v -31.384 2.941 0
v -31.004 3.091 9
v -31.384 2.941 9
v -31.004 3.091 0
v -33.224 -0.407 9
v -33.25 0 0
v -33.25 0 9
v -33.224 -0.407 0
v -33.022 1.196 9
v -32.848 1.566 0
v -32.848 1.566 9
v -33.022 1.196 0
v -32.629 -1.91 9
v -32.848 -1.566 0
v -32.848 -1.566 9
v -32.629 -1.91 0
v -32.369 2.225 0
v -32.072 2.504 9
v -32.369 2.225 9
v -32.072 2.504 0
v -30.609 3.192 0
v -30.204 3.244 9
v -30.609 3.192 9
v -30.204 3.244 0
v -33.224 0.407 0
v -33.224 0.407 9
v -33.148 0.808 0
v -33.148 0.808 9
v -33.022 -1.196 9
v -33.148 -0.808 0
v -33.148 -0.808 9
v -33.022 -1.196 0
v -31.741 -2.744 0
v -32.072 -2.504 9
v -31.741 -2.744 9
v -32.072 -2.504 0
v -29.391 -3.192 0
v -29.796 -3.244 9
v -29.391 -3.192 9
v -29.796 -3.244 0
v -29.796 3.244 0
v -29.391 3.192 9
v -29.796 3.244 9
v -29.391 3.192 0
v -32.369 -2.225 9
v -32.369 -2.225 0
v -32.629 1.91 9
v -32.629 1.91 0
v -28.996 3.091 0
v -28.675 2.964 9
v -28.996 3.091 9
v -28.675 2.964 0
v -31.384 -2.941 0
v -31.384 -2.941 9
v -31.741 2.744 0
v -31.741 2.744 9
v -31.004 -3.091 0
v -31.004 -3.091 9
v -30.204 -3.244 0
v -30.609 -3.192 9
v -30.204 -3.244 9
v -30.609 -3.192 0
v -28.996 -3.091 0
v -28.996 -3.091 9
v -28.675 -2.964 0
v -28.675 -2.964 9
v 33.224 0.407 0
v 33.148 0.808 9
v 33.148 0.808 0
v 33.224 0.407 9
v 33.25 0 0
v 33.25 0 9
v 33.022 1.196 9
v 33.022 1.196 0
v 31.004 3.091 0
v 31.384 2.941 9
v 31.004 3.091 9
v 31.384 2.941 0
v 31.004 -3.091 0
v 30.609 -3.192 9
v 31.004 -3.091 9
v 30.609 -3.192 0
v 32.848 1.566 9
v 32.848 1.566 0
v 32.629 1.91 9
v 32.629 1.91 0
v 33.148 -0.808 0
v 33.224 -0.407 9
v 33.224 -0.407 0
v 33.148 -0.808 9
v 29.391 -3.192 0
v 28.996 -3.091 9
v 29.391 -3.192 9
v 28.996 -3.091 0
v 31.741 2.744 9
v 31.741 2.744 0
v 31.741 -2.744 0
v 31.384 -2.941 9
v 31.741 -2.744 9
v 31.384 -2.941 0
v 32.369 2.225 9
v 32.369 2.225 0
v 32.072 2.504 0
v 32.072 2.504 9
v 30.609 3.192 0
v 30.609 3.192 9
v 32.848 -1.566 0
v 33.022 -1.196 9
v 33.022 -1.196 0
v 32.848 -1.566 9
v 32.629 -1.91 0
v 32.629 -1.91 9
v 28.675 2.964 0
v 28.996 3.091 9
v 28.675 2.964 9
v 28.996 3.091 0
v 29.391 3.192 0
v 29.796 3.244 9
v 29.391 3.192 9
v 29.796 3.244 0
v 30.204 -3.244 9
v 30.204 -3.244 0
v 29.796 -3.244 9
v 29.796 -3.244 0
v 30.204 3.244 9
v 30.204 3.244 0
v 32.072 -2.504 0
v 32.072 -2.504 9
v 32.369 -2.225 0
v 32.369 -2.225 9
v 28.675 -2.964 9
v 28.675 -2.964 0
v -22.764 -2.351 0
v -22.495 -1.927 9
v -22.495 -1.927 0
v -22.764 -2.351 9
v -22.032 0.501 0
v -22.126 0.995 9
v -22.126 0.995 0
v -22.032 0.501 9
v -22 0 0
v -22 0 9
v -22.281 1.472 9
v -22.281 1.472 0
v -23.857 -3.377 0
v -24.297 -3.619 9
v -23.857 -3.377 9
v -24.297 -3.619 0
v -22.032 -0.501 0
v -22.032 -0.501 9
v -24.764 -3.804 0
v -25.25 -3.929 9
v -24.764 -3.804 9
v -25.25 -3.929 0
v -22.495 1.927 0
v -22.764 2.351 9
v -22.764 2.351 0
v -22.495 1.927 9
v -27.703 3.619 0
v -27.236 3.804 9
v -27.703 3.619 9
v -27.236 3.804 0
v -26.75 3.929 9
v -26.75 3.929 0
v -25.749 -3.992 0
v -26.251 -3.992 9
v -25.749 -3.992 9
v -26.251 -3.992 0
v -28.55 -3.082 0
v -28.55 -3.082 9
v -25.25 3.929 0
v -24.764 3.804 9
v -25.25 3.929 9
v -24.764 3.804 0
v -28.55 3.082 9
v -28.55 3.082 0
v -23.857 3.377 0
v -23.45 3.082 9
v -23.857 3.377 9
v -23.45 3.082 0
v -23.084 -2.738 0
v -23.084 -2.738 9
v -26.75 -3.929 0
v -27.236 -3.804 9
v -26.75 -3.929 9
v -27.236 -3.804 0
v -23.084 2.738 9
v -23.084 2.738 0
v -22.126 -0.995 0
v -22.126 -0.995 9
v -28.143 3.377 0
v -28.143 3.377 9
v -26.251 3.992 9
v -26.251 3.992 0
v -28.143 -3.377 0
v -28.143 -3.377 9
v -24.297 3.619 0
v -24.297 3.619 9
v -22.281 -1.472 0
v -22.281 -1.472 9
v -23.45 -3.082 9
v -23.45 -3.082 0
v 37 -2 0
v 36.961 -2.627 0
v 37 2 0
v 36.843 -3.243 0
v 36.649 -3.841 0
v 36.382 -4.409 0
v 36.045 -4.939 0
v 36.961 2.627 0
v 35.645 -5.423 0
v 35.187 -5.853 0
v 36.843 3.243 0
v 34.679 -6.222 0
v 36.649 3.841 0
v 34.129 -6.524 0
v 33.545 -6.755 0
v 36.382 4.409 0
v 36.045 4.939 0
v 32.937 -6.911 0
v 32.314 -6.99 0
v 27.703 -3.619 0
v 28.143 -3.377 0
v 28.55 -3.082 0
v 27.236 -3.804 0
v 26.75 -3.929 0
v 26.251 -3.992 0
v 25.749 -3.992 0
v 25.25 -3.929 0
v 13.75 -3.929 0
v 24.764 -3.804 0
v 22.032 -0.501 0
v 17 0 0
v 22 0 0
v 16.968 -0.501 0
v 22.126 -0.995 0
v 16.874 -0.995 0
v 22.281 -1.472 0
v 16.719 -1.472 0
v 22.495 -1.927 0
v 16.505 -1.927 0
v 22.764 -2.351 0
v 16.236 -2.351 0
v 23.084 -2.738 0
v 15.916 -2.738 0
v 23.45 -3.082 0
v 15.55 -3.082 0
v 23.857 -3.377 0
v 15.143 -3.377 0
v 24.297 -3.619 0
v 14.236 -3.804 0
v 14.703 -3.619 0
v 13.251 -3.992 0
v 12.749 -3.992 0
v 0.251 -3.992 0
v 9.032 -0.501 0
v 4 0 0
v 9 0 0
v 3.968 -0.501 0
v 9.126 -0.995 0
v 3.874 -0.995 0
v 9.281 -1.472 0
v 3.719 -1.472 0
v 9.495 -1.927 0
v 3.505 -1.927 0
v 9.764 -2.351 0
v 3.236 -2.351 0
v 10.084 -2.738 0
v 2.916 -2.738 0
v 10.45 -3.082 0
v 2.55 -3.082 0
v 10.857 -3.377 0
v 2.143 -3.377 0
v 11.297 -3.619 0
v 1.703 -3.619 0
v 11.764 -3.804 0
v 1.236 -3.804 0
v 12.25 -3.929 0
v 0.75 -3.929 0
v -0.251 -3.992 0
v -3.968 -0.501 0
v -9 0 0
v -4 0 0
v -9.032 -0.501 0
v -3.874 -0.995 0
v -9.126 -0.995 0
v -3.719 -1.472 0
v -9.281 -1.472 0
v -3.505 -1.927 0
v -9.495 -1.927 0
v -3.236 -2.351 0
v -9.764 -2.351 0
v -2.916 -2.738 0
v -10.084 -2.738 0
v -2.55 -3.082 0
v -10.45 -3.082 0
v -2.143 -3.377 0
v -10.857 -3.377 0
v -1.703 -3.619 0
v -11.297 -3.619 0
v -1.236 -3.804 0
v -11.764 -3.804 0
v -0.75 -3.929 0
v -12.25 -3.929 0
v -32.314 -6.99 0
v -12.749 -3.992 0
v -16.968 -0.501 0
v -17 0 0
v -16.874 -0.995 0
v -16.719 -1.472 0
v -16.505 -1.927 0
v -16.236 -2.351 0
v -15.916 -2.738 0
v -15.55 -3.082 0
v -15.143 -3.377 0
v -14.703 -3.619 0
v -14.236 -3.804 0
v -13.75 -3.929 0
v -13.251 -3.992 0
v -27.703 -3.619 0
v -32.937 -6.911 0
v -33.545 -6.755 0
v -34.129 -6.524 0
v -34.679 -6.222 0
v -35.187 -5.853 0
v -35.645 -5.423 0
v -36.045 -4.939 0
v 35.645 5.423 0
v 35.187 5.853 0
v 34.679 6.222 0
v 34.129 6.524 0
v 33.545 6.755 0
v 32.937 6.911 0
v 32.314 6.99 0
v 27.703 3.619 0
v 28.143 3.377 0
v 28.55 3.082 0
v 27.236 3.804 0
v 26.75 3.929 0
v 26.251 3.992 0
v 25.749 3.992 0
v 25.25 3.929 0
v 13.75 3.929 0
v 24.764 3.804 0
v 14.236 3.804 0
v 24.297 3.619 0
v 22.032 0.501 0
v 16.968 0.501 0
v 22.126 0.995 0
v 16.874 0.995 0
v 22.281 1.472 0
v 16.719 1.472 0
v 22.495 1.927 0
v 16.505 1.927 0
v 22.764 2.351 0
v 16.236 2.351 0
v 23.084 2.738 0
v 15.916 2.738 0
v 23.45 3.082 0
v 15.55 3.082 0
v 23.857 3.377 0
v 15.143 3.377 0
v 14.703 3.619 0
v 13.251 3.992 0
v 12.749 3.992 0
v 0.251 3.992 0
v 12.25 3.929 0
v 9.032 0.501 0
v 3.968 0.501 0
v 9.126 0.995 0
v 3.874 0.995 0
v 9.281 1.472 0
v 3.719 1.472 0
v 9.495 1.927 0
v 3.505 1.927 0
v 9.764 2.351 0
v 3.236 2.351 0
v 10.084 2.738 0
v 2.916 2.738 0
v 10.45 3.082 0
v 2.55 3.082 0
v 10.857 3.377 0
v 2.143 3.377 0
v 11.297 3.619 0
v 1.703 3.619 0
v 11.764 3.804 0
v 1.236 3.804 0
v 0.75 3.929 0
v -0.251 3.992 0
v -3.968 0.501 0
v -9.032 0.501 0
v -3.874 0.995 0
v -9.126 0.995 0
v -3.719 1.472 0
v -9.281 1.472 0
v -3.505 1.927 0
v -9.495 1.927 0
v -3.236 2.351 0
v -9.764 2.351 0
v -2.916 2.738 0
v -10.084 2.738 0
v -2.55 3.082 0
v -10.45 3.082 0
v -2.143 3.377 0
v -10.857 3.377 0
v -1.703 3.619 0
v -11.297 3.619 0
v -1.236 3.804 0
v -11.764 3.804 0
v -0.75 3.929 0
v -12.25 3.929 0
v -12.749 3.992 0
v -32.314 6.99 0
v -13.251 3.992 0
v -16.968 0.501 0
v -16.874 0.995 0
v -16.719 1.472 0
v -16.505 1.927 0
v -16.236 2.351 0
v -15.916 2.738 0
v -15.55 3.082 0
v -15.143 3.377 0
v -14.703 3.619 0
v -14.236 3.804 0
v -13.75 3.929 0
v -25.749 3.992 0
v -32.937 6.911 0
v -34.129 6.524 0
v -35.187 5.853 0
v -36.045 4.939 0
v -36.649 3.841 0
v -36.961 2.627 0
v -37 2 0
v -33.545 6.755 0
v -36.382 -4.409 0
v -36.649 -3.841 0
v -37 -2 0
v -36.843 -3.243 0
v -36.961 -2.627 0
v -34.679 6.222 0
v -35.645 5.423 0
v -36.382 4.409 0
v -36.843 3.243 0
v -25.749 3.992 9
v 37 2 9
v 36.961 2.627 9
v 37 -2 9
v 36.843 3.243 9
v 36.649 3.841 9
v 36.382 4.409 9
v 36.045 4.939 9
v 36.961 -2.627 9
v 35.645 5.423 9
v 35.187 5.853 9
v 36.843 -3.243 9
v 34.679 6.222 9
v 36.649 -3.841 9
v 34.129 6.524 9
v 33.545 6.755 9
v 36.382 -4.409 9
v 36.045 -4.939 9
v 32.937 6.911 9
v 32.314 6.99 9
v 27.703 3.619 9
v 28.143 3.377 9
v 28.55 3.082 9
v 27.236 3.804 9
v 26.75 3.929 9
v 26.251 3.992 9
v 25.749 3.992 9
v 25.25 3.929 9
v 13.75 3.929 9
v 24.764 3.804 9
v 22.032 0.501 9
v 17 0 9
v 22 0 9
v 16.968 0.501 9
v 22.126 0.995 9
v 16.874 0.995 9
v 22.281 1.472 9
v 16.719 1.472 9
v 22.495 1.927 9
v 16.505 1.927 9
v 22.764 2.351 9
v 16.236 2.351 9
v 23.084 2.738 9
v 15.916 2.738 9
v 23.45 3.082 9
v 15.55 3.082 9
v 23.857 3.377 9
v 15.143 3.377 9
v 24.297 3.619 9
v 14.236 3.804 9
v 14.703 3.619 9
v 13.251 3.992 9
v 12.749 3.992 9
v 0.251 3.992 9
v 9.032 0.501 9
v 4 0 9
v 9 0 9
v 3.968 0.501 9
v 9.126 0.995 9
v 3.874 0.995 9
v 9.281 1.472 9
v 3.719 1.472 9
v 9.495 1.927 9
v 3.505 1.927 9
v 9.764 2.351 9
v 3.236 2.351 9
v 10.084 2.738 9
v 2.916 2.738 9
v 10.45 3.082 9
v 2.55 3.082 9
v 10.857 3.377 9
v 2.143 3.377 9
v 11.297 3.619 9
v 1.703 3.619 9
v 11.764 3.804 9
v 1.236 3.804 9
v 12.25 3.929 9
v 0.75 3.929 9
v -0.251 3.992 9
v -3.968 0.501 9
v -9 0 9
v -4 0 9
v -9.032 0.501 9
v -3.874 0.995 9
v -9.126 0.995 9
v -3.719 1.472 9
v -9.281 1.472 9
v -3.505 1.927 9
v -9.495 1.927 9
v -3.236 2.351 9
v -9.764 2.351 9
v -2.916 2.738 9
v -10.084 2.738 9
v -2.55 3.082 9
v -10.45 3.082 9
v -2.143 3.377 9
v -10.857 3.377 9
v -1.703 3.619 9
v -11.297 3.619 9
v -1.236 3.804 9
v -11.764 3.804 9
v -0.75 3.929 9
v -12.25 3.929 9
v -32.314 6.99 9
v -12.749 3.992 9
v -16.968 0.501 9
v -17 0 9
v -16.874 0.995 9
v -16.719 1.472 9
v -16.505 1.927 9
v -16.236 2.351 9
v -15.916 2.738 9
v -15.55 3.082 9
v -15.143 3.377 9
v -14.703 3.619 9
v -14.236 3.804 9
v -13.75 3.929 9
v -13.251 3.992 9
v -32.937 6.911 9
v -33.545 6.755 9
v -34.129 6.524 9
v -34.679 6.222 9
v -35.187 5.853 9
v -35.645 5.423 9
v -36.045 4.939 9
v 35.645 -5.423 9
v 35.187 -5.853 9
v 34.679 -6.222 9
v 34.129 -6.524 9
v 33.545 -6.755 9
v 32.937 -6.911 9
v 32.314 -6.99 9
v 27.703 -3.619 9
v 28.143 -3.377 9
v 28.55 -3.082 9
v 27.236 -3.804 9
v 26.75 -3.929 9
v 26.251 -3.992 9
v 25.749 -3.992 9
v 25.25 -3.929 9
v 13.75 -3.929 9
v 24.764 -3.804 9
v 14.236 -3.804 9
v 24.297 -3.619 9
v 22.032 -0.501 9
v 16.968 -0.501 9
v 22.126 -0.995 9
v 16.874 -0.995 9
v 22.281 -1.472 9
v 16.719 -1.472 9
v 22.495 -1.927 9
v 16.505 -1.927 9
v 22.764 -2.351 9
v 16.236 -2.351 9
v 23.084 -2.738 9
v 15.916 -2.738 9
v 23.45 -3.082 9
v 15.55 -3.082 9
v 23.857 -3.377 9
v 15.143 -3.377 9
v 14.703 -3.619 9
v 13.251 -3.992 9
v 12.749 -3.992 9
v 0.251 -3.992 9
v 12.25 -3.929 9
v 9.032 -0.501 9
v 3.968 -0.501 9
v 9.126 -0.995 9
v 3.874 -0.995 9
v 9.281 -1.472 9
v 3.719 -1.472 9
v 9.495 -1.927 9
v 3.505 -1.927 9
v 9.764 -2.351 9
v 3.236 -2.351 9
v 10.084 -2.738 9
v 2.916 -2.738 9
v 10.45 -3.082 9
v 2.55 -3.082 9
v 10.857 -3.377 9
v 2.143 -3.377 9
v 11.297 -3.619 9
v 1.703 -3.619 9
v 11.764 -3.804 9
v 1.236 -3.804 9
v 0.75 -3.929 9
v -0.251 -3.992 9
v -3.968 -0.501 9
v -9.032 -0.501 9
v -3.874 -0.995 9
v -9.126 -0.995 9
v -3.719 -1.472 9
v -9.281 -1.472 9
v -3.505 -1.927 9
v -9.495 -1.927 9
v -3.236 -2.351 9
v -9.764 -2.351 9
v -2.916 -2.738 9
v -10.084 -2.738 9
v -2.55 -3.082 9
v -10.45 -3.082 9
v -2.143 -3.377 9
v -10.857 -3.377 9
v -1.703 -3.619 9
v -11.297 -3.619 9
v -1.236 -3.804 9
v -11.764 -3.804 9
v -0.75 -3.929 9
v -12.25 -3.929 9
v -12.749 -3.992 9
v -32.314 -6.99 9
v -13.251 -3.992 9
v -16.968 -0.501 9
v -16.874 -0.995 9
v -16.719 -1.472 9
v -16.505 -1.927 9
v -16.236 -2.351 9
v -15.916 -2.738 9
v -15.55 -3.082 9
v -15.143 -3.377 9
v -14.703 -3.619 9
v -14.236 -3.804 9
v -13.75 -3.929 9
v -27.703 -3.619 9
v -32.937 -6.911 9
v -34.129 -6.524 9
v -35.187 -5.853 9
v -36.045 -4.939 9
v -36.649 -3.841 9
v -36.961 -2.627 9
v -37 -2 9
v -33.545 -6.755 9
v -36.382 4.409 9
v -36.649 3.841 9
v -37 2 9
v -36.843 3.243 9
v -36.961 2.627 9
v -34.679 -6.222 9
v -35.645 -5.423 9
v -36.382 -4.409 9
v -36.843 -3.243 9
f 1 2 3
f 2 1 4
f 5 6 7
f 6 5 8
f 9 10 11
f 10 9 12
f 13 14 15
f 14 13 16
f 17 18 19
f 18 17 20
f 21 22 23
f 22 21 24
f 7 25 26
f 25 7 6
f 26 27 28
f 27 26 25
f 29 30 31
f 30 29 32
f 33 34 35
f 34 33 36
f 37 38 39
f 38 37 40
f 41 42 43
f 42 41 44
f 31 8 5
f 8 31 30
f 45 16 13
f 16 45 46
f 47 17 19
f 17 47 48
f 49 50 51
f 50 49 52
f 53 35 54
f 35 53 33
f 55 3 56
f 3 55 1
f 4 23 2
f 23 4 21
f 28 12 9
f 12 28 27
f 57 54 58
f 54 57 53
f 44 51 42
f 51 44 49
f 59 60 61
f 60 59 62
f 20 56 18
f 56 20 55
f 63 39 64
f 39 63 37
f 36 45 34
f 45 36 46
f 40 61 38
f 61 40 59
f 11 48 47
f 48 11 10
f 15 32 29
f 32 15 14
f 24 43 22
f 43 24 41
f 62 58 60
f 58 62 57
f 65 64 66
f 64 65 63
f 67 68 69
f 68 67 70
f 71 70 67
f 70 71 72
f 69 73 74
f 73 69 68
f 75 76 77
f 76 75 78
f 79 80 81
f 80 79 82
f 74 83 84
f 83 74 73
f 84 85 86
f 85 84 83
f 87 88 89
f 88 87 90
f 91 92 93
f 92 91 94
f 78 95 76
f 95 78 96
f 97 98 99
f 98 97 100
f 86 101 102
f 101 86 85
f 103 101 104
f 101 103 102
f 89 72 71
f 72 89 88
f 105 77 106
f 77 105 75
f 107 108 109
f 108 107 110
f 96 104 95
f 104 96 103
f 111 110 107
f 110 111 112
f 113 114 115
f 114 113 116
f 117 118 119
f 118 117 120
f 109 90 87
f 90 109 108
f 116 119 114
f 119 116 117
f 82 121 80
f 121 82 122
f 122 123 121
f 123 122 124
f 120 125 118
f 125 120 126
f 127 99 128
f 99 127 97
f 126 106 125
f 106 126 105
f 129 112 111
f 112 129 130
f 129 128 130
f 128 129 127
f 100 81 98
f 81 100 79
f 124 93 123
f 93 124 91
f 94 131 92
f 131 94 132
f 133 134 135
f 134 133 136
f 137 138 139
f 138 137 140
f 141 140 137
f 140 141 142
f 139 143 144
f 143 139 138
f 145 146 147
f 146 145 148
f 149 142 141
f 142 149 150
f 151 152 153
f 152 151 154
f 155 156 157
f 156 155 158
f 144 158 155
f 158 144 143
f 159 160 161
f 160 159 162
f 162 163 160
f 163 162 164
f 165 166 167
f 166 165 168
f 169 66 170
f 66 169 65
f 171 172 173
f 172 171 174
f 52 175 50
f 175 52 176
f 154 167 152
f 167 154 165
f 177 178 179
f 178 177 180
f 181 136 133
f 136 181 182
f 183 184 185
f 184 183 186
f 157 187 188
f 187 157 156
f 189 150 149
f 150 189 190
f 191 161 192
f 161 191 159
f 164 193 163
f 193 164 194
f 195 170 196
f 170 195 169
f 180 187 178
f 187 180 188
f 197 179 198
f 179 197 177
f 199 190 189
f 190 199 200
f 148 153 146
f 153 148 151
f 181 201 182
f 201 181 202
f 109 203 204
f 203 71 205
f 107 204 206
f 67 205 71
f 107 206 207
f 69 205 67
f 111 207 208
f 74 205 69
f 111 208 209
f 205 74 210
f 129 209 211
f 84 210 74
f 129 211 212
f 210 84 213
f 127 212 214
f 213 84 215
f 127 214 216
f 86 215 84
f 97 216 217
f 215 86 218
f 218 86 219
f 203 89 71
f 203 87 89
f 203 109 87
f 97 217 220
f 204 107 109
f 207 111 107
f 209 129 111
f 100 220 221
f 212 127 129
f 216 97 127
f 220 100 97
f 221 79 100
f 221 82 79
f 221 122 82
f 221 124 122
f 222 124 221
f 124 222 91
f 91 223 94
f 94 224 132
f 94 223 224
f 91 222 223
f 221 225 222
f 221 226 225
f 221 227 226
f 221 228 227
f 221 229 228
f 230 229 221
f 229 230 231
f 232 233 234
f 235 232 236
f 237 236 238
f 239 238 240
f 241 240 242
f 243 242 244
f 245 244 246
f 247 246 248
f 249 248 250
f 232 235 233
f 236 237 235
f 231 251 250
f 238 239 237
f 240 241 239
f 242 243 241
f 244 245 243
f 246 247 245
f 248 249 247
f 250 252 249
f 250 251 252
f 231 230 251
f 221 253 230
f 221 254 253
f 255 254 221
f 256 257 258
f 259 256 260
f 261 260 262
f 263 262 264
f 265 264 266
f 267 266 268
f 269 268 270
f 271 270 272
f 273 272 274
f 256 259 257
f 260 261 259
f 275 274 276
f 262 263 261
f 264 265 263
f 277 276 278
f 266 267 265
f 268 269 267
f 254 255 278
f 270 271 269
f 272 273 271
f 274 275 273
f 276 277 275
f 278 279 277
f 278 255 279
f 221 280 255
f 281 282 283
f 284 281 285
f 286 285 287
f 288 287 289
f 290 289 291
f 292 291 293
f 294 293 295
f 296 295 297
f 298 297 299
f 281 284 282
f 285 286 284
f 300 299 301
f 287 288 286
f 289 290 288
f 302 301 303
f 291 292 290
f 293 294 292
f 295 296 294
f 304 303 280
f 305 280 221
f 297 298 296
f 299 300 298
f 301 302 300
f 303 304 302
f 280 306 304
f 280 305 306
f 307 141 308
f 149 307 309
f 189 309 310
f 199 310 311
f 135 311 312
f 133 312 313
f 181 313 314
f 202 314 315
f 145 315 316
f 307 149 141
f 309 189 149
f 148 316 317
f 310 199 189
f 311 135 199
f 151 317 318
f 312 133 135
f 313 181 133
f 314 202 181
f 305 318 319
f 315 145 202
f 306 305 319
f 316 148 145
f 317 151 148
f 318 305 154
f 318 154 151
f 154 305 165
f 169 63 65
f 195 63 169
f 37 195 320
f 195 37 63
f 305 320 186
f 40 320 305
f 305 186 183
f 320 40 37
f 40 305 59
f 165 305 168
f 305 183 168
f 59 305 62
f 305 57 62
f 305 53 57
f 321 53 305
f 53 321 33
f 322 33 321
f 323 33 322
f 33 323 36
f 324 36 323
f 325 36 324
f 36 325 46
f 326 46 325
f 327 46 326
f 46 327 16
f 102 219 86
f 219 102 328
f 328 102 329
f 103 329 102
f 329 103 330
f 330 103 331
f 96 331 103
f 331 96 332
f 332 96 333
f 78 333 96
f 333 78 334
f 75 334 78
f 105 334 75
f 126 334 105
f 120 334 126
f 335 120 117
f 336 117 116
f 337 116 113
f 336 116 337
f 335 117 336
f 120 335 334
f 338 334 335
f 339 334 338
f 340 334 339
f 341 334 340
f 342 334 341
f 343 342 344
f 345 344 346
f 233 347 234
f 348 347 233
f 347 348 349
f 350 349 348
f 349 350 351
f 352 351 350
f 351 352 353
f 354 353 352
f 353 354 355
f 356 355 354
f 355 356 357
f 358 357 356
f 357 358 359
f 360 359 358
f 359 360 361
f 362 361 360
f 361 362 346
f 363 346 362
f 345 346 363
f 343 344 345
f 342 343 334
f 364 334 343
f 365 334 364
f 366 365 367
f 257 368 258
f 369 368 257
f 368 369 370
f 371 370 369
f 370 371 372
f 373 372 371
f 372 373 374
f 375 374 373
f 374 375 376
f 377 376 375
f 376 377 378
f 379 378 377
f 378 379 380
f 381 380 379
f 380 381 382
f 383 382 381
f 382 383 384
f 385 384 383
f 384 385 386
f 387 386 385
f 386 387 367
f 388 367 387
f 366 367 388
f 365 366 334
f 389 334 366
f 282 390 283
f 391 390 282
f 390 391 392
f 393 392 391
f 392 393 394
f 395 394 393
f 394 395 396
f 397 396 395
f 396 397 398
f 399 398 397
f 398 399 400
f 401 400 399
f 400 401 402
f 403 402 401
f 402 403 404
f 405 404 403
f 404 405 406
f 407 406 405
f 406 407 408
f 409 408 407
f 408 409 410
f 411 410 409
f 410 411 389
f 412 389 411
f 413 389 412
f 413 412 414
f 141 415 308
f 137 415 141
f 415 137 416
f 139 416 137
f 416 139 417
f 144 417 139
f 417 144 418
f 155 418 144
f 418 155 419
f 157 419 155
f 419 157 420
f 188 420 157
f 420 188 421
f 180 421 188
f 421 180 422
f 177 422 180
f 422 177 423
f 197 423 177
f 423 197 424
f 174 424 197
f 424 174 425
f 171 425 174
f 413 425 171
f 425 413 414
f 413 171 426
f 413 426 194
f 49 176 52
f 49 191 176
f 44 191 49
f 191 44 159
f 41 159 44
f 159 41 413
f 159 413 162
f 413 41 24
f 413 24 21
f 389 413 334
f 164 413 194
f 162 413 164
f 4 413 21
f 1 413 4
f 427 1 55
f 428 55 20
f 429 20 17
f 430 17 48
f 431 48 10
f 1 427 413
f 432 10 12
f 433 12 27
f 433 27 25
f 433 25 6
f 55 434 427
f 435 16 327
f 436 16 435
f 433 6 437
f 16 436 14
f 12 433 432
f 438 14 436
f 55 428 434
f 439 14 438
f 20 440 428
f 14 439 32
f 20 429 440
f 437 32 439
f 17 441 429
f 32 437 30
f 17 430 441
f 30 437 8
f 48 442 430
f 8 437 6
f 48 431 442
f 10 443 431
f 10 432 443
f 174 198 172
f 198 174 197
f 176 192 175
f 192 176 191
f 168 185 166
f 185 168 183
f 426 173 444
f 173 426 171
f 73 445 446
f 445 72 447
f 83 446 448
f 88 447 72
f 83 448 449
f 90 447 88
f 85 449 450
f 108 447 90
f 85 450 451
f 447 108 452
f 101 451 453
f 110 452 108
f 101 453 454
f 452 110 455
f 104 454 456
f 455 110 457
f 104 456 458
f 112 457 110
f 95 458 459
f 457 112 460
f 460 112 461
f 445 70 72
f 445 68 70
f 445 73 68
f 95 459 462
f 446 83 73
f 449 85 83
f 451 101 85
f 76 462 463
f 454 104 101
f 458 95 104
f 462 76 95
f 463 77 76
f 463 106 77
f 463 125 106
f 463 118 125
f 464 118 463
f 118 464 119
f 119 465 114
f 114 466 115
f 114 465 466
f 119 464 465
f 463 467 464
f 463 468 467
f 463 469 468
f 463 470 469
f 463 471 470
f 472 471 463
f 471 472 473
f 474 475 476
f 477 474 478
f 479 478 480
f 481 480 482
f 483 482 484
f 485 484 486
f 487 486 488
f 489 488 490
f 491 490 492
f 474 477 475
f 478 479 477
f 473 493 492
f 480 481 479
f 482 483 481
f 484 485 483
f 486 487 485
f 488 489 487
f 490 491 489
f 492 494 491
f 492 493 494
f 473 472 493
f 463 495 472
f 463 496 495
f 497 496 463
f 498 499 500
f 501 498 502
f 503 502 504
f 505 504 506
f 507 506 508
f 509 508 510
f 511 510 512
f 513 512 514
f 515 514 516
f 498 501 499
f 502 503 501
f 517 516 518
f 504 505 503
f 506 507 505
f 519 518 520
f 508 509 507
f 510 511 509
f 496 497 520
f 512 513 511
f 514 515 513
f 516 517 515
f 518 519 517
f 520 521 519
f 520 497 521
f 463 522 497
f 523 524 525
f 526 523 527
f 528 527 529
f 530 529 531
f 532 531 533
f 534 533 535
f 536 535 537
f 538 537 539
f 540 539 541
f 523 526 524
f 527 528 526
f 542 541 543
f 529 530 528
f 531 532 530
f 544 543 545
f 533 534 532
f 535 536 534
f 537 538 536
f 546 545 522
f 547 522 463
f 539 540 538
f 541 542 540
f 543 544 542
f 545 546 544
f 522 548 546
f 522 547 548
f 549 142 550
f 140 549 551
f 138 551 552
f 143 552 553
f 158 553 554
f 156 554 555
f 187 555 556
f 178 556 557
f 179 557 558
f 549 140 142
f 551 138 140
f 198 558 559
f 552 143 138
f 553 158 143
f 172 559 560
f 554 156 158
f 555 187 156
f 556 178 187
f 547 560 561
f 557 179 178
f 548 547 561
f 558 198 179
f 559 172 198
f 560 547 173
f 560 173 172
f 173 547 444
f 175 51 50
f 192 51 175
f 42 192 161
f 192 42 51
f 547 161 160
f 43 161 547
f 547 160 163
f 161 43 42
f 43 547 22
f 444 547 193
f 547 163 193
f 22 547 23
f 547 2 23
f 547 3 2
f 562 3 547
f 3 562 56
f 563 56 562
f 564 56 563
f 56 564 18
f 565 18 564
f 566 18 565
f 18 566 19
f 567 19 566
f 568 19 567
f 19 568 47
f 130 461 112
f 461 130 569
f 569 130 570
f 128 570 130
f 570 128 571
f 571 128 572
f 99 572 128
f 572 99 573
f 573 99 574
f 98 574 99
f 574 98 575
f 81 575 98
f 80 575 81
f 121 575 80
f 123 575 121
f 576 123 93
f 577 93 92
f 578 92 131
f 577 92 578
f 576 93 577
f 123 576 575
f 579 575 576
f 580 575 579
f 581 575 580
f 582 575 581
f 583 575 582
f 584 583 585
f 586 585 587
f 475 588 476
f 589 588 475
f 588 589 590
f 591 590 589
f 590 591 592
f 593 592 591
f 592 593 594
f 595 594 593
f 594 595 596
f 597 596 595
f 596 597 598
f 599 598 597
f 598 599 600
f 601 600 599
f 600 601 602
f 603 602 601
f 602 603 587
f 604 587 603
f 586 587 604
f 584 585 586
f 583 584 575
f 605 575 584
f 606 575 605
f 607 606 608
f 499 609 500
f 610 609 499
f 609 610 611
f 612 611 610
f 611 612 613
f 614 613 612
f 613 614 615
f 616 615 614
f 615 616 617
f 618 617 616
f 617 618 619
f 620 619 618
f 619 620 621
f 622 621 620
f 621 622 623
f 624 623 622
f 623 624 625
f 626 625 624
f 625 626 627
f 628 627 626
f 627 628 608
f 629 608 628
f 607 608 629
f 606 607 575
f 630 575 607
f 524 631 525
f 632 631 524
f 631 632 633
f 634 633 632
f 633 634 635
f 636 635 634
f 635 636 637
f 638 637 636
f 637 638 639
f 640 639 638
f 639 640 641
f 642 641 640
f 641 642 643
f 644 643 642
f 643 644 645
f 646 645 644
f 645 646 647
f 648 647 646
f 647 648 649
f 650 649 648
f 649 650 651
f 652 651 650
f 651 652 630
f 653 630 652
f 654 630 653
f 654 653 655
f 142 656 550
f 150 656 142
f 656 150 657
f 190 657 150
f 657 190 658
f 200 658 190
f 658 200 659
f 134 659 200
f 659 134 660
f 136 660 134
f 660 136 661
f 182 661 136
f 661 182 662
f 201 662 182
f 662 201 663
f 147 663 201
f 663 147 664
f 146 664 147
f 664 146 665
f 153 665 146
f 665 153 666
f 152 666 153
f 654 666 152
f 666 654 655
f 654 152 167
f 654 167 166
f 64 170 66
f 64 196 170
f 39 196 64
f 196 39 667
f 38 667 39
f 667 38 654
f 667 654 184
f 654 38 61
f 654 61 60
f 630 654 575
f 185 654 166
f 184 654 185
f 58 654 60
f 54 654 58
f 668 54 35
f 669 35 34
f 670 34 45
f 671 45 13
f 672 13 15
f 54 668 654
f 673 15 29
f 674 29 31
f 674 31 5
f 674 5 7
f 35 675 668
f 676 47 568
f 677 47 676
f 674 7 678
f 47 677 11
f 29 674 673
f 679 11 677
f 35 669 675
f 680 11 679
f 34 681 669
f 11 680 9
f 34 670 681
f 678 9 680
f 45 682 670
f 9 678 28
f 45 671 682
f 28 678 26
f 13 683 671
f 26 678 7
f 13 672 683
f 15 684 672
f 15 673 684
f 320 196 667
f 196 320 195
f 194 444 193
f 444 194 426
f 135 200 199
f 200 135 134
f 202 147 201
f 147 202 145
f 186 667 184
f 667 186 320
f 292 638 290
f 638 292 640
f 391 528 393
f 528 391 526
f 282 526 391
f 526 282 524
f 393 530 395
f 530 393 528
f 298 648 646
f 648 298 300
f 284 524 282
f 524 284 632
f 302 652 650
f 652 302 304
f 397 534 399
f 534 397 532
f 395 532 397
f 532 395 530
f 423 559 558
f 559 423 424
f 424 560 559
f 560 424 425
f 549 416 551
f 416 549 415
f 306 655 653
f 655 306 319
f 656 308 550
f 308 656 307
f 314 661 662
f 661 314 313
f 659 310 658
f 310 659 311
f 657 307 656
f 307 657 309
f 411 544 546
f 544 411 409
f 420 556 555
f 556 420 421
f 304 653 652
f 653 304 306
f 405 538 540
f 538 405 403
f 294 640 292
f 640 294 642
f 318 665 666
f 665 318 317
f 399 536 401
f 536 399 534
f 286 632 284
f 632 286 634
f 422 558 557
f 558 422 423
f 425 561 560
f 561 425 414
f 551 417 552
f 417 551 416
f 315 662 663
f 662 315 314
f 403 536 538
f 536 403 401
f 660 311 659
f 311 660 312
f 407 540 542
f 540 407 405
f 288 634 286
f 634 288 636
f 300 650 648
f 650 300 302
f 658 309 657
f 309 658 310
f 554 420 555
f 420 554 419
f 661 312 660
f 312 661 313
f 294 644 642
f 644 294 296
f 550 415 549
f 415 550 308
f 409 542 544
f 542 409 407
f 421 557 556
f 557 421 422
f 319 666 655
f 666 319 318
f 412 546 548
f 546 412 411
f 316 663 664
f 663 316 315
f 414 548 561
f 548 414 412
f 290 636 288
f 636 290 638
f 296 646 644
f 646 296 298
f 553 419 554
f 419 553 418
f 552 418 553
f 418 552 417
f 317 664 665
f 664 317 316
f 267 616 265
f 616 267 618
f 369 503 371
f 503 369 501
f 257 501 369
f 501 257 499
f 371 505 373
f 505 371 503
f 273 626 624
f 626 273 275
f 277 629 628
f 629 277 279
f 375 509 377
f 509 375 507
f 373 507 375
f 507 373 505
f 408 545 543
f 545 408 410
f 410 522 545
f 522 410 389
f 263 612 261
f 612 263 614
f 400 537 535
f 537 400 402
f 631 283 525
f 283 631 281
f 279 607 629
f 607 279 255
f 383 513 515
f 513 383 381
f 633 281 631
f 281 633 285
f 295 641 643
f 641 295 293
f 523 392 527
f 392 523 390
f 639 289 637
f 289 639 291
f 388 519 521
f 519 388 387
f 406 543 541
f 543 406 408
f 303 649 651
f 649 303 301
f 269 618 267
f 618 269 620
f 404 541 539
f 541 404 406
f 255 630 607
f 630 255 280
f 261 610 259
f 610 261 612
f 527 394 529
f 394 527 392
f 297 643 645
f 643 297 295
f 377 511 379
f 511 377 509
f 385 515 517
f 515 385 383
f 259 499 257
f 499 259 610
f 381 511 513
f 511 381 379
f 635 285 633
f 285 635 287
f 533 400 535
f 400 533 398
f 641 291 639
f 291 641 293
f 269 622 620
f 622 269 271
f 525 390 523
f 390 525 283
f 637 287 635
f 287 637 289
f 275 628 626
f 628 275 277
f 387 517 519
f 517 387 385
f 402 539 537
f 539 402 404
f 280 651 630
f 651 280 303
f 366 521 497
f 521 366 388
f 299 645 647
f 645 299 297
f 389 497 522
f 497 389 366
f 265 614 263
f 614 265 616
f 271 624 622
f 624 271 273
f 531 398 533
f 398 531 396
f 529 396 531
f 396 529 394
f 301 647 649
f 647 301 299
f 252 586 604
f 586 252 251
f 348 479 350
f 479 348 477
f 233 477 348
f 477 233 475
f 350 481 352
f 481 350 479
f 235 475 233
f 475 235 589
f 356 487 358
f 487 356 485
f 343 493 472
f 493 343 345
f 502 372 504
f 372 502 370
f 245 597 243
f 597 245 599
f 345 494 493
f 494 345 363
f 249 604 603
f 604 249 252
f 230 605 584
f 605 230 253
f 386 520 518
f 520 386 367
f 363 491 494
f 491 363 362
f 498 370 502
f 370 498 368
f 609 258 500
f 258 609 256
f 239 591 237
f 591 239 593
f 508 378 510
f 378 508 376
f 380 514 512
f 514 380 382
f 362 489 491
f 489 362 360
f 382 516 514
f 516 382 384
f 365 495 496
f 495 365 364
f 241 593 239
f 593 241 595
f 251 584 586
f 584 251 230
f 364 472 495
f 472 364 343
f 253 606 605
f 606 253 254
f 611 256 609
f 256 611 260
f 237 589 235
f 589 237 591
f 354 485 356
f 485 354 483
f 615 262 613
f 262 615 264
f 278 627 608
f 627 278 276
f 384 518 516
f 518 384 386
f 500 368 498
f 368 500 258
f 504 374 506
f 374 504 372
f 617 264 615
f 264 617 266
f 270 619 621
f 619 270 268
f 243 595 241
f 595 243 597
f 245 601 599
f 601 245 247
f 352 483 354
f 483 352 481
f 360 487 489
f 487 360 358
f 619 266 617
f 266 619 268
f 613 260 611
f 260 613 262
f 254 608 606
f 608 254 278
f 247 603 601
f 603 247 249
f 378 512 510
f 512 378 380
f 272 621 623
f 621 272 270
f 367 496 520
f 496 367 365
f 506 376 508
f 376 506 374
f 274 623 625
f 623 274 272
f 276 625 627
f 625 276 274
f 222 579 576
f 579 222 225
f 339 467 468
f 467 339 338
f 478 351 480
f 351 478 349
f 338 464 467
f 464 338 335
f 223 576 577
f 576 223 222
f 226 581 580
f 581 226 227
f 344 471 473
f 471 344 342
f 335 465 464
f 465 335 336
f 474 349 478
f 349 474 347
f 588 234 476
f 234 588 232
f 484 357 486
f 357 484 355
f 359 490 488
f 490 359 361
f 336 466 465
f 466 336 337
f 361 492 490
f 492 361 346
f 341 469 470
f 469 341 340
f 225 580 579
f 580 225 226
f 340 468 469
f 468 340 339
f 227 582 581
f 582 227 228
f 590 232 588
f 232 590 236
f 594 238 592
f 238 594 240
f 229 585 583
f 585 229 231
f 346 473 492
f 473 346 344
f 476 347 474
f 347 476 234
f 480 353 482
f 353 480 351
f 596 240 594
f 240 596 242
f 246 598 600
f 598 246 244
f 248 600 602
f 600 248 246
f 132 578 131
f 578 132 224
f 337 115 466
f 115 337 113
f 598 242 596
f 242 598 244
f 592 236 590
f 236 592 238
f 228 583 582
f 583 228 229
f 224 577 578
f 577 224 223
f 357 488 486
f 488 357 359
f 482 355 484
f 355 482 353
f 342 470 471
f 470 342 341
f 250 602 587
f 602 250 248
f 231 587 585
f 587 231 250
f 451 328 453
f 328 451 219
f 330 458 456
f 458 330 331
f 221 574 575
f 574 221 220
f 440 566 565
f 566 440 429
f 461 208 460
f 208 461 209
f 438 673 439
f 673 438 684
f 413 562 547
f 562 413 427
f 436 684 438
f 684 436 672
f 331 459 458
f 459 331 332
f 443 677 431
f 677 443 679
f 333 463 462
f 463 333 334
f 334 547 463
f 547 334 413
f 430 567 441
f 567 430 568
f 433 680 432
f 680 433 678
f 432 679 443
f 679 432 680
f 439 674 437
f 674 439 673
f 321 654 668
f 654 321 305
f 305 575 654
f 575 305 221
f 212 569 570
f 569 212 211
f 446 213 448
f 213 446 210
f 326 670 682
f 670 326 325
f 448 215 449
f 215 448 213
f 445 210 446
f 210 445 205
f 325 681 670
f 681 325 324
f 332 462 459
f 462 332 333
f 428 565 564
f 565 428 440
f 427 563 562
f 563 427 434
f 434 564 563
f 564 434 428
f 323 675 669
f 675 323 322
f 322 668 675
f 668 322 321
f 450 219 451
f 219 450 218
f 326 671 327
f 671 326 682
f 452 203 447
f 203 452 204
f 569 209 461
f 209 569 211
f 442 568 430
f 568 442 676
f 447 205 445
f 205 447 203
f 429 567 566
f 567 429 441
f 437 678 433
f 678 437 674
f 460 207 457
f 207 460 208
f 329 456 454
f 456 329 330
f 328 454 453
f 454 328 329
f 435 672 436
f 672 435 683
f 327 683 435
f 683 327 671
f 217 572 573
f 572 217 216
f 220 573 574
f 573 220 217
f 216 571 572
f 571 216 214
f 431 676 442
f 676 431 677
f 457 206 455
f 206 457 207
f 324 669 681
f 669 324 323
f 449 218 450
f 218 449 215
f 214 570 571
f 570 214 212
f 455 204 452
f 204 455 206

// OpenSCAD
$fn = 50;

difference() {
	union() {
		hull() {
			translate(v = [-32.0, 2.0, 0]) {
				cylinder(h = 9, r = 5);
			}
			translate(v = [32.0, 2.0, 0]) {
				cylinder(h = 9, r = 5);
			}
			translate(v = [-32.0, -2.0, 0]) {
				cylinder(h = 9, r = 5);
			}
			translate(v = [32.0, -2.0, 0]) {
				cylinder(h = 9, r = 5);
			}
		}
	}
	union() {
		translate(v = [-30.0, 0.0, -100.0]) {
			cylinder(h = 200, r = 3.25);
		}
		translate(v = [30.0, 0.0, -100.0]) {
			cylinder(h = 200, r = 3.25);
		}
		translate(v = [-30.0, 0.0, -100.0]) {
			cylinder(h = 200, r = 1.8);
		}
		translate(v = [30.0, 0.0, -100.0]) {
			cylinder(h = 200, r = 1.8);
		}
		translate(v = [-26.0, 0, 0.0]) {
			cylinder(h = 9, r = 4.0);
		}
		translate(v = [-13.0, 0, 0.0]) {
			cylinder(h = 9, r = 4.0);
		}
		cylinder(h = 9, r = 4.0);
		translate(v = [13.0, 0, 0.0]) {
			cylinder(h = 9, r = 4.0);
		}
		translate(v = [26.0, 0, 0.0]) {
			cylinder(h = 9, r = 4.0);
		}
	}
}
